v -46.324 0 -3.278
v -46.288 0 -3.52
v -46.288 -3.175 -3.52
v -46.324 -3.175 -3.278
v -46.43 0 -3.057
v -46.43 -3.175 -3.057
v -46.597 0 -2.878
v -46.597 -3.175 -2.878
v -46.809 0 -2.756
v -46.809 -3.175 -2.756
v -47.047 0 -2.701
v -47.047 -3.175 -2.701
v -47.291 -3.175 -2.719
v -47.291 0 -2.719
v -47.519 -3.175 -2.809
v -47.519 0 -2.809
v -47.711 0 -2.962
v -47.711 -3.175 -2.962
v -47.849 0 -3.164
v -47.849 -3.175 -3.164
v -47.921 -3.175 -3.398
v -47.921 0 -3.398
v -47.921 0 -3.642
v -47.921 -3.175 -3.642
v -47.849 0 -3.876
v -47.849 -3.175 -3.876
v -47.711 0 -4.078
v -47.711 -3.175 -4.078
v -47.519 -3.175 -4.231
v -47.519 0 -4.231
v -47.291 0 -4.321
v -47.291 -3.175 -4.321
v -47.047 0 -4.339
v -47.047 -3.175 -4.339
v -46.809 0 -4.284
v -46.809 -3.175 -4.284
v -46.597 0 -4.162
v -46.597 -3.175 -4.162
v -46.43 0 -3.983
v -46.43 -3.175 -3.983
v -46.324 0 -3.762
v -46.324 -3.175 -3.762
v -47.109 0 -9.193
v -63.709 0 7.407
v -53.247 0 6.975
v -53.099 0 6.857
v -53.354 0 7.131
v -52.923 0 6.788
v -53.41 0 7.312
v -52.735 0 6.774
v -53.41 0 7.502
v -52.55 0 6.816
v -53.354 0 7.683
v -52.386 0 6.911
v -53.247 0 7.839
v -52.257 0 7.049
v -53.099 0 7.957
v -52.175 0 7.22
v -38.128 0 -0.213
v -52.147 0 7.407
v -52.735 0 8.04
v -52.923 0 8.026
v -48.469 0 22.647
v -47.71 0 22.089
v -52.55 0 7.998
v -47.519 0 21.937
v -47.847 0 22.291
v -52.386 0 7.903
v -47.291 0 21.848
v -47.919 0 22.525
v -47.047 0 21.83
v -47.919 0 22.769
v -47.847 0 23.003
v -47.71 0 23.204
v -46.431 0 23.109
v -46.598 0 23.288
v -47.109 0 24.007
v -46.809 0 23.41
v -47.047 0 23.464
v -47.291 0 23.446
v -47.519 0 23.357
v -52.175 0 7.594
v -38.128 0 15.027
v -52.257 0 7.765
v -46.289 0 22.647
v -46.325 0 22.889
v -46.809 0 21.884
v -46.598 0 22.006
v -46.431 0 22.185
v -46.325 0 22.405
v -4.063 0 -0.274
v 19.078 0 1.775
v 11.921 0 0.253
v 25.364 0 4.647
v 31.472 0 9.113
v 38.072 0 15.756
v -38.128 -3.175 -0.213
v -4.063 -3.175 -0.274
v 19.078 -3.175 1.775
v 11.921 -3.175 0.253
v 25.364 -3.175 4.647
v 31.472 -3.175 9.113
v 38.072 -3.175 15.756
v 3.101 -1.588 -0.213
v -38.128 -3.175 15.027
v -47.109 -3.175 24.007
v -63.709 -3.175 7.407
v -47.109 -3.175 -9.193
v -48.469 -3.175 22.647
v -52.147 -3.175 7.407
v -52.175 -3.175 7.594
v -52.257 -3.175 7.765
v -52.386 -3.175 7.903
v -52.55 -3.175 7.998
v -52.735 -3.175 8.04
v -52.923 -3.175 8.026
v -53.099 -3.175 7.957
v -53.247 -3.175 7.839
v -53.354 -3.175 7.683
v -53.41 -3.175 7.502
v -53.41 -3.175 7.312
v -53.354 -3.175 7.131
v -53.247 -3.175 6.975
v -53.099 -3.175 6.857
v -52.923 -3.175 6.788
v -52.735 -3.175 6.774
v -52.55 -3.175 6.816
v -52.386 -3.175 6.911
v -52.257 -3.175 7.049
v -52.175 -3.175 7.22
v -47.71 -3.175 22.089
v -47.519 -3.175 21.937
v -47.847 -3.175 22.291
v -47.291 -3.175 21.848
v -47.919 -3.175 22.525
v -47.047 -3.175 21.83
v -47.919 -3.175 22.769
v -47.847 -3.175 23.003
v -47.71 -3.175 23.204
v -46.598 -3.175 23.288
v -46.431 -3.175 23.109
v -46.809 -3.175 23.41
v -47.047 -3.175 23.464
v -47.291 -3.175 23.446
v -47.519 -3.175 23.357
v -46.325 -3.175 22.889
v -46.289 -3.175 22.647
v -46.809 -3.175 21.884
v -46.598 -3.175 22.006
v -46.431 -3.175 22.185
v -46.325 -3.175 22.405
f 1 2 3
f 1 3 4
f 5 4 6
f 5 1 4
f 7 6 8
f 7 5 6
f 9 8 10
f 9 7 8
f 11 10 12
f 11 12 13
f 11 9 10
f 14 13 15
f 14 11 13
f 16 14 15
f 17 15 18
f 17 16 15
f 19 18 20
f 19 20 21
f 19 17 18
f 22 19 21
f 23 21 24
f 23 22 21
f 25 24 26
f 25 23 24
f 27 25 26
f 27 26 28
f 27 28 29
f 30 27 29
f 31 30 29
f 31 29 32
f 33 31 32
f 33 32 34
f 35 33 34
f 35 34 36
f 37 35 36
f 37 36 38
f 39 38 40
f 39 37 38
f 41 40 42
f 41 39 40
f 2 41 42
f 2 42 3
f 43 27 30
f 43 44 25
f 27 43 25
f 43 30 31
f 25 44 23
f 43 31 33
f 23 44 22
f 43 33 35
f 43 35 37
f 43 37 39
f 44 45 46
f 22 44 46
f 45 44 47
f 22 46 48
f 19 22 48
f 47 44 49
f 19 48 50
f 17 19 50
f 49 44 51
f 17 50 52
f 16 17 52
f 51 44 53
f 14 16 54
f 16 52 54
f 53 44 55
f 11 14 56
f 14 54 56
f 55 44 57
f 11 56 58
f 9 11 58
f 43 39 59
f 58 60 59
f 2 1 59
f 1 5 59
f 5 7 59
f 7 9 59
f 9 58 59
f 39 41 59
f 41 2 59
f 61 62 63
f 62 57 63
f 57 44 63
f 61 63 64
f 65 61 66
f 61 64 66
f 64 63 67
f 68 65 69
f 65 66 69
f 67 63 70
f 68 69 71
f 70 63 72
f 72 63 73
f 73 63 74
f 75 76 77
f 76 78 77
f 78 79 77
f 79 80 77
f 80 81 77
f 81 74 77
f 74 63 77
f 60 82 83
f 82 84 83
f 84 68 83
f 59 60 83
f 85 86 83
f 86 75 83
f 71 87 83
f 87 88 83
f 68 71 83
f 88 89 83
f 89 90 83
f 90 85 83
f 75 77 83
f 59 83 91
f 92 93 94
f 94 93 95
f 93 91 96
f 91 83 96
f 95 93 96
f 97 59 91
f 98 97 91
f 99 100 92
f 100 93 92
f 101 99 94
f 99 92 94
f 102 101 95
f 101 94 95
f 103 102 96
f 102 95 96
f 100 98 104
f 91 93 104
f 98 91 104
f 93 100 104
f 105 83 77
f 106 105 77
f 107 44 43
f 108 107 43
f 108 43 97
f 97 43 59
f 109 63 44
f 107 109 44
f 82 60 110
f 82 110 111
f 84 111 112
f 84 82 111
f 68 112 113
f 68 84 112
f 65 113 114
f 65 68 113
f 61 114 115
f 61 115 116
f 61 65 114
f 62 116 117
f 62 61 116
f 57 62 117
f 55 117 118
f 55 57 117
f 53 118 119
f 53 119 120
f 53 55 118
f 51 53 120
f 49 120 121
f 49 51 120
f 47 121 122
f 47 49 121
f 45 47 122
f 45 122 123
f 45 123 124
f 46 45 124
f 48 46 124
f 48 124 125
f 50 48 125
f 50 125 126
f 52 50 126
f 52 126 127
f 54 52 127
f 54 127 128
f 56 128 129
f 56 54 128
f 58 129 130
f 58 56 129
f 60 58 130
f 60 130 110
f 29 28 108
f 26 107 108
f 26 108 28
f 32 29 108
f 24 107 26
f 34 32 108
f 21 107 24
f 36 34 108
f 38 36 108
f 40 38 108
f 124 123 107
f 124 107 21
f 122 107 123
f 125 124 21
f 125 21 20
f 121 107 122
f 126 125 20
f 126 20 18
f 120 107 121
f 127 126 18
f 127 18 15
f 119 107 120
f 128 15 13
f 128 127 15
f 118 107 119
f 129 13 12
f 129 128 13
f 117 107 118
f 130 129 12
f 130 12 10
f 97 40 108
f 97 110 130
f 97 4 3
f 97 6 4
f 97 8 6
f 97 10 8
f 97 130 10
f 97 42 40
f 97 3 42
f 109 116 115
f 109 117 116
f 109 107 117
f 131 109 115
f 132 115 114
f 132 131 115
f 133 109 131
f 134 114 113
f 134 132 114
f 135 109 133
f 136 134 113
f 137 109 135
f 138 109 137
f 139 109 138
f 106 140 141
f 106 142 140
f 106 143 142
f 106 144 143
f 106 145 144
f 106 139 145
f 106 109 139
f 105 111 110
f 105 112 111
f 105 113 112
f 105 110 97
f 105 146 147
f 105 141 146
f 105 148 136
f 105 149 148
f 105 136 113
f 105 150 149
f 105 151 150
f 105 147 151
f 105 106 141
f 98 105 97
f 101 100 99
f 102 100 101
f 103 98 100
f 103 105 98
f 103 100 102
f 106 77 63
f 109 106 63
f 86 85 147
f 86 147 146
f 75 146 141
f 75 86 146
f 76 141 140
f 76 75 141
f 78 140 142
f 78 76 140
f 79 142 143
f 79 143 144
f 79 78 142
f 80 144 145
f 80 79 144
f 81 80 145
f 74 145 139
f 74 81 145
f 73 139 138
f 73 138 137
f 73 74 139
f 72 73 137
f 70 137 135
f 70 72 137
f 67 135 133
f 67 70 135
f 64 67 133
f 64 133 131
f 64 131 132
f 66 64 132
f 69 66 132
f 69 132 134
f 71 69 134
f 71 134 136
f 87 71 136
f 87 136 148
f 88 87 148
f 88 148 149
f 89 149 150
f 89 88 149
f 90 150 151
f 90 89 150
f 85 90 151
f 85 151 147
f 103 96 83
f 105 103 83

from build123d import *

# Parameters (mm, degrees)
F0_R     = 0.8211030373
F0_R_2   = 0.635
F0_R_3   = 0.8197091978
F1_DEPTH = 3.175


with BuildPart() as f1:
    # F0 (on Front) → F1 (new body)
    with BuildSketch(Plane.XZ):
        with BuildLine():
            Line((-47.1087390124, 24.0072626846), (-48.469083822, 22.6469178751))
            Line((-48.469083822, 22.6469178751), (-63.7089951335, 7.4070065636))
            Line((-63.7089951335, 7.4070065636), (-52.7819947797, -3.5199937902))
            Line((-52.7819947797, -3.5199937902), (-47.1087390124, -9.1932495575))
            Line((-47.1087390124, -9.1932495575), (-38.1284828914, -0.2129934364))
            add(Edge.make_bspline(
                [(-38.1284828914, -0.2129934364), (-26.814672436, 0), (6.2425657095, -0.8439129588), (24.9296786636, 0.8068612607), (38.0715171086, 15.7557384048)],
                knots=[0, 0, 0, 0, 0.5087461109, 1, 1, 1, 1], degree=3))
            Line((38.0715171086, 15.7557384048), (-38.1284828914, 15.0270065636))
            Line((-38.1284828914, 15.0270065636), (-47.1087390124, 24.0072626846))
        make_face()
        with Locations((-47.1087390124, -3.5199937902)):
            Circle(F0_R, mode=Mode.SUBTRACT)
        with Locations((-52.7819947797, 7.4070065636)):
            Circle(F0_R_2, mode=Mode.SUBTRACT)
        with Locations((-47.1087390124, 22.6469178751)):
            Circle(F0_R_3, mode=Mode.SUBTRACT)
    extrude(amount=F1_DEPTH)


solid = f1.part
